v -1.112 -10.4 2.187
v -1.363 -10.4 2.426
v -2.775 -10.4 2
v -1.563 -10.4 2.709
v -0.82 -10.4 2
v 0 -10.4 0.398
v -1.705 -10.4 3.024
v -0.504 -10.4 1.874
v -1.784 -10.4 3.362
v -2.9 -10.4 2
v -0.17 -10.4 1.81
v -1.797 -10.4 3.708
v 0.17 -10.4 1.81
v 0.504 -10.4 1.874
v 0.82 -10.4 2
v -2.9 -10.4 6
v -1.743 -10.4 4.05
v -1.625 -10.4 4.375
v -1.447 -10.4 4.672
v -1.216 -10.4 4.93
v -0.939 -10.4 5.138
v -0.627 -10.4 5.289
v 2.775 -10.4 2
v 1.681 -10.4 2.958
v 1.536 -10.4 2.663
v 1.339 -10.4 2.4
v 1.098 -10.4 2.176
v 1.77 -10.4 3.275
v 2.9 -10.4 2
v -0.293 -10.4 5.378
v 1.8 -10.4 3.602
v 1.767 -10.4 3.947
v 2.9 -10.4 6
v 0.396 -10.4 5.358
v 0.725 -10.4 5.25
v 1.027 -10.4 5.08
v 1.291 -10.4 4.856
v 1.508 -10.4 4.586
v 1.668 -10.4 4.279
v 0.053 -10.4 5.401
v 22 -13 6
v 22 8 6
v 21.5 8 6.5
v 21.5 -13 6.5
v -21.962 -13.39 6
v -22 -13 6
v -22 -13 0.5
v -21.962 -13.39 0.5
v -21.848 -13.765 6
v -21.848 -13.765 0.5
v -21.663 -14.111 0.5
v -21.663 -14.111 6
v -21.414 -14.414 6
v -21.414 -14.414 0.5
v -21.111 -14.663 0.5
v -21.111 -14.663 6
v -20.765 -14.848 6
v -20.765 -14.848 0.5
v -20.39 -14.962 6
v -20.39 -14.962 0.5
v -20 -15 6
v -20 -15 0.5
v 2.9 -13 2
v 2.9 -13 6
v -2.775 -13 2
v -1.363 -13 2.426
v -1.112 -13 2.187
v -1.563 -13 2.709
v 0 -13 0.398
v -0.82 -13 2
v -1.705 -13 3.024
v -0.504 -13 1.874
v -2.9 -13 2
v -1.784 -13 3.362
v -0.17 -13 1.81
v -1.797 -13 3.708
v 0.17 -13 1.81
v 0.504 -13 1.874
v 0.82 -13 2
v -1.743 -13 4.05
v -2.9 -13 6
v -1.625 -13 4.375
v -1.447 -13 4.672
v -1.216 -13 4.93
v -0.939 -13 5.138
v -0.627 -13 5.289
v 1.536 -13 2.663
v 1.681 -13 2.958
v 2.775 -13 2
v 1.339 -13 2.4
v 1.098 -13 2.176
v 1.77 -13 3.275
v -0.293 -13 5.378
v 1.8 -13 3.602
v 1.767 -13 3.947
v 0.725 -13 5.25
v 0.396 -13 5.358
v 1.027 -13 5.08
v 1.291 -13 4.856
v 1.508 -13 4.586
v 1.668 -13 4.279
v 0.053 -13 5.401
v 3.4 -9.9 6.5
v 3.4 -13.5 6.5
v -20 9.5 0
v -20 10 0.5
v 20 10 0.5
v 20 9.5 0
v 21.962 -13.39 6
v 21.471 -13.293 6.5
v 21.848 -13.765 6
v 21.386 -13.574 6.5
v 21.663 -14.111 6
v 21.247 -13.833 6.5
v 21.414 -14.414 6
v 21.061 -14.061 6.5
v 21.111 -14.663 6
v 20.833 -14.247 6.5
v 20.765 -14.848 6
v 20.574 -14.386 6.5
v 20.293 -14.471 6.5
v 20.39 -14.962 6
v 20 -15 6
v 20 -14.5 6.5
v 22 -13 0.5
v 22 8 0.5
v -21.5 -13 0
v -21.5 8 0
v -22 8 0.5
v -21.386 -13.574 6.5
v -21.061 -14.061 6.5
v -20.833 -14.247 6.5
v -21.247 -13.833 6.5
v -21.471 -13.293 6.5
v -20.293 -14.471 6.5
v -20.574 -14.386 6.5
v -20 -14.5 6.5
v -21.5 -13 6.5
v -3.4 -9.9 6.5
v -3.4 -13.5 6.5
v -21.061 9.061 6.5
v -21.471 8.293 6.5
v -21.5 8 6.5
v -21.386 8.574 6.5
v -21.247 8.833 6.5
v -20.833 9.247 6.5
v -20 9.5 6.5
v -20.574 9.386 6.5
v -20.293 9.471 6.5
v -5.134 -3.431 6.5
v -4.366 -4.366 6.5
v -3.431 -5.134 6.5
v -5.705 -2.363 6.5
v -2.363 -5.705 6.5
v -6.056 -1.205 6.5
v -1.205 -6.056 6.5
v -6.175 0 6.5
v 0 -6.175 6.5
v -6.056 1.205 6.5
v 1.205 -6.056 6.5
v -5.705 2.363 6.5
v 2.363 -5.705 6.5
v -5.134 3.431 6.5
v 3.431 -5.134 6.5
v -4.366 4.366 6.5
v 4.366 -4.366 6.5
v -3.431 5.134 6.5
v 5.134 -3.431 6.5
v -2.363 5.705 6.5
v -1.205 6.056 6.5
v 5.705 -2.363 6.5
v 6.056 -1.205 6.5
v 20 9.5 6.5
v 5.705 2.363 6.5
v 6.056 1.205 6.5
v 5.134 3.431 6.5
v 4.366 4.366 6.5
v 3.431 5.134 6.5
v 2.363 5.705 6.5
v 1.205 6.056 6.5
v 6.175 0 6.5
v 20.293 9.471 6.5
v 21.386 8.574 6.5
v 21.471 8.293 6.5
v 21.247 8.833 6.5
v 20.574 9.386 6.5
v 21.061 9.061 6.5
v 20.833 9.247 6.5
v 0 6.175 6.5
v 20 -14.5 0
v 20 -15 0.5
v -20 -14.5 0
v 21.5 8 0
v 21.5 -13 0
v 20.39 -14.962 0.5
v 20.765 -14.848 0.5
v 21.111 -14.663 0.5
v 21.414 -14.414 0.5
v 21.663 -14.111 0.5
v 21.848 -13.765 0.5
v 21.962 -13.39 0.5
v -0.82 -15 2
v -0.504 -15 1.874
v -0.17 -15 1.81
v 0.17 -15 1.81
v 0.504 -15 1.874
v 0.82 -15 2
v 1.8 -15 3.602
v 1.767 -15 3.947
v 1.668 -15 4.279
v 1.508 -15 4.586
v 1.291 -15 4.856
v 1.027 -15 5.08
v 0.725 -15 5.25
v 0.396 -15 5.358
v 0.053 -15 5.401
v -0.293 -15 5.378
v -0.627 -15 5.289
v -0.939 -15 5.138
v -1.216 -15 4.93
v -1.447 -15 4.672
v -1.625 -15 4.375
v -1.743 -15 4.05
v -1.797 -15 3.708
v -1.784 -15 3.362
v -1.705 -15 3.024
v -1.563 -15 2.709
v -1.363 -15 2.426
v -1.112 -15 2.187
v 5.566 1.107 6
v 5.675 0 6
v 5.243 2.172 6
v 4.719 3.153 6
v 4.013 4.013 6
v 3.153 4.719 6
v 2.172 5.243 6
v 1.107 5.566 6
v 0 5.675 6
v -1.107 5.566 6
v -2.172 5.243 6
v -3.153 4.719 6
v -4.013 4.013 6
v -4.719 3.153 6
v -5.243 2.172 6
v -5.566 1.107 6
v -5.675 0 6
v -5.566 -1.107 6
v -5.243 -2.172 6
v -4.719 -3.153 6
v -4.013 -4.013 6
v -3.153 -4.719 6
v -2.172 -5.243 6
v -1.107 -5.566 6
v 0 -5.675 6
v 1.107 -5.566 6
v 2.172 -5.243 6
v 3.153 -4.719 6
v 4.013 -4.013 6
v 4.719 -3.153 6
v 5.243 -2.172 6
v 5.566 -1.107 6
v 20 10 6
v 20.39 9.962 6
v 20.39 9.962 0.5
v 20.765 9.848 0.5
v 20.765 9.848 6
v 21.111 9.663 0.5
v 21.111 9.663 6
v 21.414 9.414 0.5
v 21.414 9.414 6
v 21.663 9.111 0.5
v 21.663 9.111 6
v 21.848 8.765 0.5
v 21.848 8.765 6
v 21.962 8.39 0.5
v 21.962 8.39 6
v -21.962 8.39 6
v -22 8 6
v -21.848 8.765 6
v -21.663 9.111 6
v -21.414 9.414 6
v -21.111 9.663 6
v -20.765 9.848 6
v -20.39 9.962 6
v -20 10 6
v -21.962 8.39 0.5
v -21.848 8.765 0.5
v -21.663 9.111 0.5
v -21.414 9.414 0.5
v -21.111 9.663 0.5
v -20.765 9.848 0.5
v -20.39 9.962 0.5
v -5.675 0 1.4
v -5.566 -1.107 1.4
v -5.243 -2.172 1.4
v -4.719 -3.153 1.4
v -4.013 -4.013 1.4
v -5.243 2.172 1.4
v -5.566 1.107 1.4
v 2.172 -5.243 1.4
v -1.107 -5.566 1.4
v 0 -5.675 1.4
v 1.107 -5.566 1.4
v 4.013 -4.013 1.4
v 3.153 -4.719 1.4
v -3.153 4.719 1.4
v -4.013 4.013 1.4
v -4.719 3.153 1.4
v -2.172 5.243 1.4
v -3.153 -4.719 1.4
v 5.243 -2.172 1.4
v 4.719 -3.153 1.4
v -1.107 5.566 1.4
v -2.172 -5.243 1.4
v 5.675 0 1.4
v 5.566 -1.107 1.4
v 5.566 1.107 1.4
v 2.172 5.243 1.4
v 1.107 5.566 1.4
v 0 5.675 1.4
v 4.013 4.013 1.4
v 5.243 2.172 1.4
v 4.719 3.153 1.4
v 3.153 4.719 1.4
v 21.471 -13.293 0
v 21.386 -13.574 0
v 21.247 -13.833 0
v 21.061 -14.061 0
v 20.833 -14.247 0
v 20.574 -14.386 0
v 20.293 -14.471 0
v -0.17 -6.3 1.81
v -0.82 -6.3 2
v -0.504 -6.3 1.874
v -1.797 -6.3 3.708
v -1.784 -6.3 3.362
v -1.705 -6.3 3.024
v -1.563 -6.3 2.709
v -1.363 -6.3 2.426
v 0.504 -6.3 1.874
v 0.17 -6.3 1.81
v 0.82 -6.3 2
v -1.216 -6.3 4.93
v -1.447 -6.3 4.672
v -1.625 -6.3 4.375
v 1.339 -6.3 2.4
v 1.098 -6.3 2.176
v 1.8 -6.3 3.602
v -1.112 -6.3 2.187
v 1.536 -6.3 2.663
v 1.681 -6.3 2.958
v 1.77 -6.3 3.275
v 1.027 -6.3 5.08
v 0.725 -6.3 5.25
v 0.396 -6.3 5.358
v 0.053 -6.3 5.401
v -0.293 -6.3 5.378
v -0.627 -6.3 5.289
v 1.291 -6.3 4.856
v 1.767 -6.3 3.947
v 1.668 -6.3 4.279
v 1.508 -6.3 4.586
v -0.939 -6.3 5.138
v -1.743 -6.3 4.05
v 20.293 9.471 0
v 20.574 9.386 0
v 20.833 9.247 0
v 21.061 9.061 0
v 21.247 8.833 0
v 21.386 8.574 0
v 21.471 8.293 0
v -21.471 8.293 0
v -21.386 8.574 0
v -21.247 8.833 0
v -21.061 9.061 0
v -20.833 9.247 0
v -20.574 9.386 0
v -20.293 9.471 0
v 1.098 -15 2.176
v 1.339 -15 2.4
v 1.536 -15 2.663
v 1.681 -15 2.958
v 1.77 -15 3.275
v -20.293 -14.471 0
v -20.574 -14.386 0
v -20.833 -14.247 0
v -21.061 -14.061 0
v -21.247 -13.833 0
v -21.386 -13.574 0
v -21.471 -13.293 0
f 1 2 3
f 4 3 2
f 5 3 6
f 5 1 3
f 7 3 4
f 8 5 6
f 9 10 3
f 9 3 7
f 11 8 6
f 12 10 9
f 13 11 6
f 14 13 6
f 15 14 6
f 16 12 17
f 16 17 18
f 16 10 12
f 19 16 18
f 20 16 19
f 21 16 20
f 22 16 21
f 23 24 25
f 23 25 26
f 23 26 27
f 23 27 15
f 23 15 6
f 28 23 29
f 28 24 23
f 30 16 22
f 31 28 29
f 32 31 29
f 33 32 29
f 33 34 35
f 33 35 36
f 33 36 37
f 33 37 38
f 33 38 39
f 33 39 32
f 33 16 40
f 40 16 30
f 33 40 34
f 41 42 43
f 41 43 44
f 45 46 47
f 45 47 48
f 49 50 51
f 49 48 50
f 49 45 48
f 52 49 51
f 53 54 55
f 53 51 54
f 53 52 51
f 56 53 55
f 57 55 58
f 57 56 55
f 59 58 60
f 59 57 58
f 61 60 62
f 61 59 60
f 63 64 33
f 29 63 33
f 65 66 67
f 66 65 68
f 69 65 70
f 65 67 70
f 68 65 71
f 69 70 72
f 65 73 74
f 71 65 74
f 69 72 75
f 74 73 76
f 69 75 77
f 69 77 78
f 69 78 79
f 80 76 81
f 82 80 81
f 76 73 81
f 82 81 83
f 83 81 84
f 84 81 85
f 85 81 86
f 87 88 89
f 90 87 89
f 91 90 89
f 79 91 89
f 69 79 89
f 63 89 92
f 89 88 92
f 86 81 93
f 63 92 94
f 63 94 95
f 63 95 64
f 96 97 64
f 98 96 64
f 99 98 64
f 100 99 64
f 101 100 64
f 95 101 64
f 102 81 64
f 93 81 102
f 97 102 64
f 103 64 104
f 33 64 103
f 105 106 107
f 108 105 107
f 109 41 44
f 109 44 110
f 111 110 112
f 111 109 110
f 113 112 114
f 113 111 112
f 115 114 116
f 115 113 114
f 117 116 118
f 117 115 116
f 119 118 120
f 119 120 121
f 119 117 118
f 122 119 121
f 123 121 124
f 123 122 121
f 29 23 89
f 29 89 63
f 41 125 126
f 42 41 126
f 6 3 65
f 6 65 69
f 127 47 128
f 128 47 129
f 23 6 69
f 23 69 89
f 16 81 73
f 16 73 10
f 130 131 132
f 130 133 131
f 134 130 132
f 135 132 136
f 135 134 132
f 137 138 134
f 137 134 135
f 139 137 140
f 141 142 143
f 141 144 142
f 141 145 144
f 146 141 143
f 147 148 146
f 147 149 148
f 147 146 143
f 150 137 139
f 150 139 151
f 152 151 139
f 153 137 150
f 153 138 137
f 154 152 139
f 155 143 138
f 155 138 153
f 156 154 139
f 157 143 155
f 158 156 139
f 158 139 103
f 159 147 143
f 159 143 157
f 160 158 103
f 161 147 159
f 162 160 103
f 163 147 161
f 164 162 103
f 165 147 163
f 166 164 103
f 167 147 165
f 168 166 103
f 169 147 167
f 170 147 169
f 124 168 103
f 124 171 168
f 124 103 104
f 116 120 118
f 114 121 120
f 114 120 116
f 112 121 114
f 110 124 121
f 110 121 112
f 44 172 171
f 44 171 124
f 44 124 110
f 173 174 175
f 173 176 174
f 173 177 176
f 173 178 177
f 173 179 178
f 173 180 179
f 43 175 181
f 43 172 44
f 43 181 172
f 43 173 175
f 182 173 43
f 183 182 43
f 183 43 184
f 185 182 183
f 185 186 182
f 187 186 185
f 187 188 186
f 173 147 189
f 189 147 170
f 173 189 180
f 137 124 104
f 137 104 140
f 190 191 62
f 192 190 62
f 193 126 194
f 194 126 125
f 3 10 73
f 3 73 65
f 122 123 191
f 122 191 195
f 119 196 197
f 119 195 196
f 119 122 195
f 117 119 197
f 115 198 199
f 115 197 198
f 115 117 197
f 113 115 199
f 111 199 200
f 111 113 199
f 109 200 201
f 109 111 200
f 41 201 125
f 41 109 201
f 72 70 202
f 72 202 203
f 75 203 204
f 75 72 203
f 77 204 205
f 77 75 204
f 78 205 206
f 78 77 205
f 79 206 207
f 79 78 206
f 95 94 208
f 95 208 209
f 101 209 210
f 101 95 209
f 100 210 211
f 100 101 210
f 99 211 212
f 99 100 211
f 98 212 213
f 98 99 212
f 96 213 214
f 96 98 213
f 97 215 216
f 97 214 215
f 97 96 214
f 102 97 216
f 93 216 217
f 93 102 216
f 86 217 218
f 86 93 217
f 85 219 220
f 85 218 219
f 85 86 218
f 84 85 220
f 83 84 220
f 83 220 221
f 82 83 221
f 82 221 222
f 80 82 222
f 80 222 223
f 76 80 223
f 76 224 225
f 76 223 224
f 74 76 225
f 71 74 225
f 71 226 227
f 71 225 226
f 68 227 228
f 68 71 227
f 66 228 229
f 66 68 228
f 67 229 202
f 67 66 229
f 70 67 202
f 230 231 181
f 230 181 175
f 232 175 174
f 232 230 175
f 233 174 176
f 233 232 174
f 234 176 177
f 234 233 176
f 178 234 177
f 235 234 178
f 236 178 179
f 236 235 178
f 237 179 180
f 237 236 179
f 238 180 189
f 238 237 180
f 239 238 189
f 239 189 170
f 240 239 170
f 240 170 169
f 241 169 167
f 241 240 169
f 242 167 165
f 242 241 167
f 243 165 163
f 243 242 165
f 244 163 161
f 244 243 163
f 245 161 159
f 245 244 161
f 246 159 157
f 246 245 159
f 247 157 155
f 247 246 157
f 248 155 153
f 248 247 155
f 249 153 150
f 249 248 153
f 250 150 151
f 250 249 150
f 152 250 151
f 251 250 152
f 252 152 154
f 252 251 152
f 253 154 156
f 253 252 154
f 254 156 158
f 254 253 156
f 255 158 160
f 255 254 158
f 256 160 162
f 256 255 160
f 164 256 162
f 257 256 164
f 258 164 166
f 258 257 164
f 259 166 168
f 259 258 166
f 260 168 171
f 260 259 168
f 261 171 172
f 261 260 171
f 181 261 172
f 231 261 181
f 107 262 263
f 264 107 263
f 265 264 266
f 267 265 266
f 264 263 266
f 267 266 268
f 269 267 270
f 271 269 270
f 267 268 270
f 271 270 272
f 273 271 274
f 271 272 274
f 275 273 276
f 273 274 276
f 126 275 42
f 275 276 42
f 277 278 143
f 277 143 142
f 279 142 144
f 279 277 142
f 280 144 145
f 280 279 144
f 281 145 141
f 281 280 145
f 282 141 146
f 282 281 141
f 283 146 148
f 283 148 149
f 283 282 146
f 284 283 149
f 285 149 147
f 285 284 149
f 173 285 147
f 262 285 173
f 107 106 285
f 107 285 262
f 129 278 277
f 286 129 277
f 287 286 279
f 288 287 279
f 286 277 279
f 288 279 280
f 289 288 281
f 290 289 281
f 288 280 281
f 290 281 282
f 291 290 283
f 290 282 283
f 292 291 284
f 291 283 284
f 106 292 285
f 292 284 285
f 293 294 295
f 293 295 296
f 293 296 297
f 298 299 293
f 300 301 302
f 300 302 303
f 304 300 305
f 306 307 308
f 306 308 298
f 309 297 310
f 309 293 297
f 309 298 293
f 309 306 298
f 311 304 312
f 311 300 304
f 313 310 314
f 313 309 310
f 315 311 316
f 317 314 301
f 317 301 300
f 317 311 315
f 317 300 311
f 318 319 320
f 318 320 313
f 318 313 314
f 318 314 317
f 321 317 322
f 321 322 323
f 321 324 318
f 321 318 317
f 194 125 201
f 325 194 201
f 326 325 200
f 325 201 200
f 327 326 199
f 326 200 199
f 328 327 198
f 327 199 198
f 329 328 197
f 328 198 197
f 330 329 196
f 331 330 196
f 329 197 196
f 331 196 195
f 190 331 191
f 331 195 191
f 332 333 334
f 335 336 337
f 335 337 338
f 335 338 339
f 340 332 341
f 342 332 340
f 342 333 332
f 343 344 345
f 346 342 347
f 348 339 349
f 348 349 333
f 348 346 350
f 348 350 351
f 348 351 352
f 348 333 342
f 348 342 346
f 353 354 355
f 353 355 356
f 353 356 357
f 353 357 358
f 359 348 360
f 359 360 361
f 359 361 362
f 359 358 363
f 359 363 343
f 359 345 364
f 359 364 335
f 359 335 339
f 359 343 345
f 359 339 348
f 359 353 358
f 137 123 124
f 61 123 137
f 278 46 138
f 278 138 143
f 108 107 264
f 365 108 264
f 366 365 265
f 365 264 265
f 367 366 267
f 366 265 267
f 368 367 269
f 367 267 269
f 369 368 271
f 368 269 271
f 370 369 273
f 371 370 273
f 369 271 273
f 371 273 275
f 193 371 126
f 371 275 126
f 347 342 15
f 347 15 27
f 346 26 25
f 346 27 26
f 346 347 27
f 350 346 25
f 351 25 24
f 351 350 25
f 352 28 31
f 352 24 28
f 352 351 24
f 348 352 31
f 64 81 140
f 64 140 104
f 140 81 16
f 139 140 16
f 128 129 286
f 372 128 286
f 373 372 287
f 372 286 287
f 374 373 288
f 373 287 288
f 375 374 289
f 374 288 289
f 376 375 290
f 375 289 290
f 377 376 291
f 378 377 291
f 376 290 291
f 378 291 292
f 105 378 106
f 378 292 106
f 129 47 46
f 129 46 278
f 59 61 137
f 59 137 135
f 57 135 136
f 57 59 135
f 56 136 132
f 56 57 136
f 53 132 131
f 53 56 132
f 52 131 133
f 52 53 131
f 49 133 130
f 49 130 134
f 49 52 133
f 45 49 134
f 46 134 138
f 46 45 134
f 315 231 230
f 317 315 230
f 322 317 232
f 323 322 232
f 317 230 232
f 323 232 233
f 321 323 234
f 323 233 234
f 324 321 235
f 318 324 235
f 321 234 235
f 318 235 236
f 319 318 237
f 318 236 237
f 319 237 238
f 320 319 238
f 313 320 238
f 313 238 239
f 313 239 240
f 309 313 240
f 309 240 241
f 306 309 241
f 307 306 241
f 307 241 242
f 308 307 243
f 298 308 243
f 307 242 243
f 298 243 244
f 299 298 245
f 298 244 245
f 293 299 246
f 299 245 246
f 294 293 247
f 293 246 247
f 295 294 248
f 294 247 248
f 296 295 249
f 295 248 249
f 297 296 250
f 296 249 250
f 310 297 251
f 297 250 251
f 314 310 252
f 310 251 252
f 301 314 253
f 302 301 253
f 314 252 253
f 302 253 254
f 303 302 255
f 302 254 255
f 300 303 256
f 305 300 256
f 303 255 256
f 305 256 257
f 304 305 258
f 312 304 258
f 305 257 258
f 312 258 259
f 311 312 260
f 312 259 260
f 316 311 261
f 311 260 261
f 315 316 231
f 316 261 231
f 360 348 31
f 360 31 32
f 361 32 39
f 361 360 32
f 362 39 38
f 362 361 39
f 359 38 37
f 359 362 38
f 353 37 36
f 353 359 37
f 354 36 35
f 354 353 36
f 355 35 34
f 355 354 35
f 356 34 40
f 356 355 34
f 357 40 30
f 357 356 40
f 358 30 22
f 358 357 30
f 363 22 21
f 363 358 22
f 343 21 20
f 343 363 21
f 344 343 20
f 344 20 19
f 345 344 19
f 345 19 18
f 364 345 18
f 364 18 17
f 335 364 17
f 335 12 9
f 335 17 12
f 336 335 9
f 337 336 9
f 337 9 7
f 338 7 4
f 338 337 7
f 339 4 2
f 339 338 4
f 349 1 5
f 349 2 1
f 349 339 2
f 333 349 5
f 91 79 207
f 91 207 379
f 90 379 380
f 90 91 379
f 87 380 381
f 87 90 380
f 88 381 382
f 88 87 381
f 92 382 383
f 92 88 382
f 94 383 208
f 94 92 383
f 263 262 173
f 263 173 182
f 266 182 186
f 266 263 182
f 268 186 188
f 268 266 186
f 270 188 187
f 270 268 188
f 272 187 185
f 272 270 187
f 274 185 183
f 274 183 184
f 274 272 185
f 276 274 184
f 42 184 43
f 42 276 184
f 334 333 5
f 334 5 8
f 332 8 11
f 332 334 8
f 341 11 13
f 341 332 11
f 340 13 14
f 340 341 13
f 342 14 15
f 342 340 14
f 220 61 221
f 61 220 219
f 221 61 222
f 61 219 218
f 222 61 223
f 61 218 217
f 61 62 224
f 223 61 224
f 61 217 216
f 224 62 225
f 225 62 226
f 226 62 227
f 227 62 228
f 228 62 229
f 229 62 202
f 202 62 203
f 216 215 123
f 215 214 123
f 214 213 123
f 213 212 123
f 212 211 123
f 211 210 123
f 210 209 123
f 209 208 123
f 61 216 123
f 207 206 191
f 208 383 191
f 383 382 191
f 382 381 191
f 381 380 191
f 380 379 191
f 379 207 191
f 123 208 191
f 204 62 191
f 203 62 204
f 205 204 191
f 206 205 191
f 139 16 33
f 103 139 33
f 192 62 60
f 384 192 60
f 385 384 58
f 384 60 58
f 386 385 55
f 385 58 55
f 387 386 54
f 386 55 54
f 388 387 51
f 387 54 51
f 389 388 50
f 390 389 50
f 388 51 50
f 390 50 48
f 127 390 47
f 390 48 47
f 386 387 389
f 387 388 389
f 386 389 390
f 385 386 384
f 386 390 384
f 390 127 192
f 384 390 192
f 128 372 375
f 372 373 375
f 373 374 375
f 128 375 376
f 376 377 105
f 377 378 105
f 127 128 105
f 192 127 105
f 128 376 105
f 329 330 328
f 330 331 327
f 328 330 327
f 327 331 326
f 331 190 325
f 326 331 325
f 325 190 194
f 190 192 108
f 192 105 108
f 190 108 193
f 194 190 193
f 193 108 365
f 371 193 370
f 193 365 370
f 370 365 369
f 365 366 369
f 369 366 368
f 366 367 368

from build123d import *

# Parameters (mm, degrees)
SKIZZE1_W                            = 44
SKIZZE1_H                            = 25
AUFSATZ_LINEAR_AUSTRAGEN1_DEPTH      = 6.5
SKIZZE2_R                            = 5.675
SCHNITT_LINEAR_AUSTRAGEN1_DEPTH      = 5.1
VERRUNDUNG1_R                        = 2
SKIZZE8_W                            = 5.8
SKIZZE8_H                            = 2.6
SCHNITT_LINEAR_AUSTRAGEN5_DEPTH      = 4.5
SCHNITT_LINEAR_AUSTRAGEN6_DEPTH      = 2.6
SCHNITT_LINEAR_AUSTRAGEN7_DEPTH      = 31.698697041
SCHNITT_LINEAR_AUSTRAGEN7_DEPTH_BACK = 4.1
FASE1_SIZE                           = 0.5


with BuildPart() as part:
    # Skizze1 → Aufsatz-Linear austragen1 (new body)
    with BuildSketch(Plane.XY):
        with Locations((0, -2.5)):
            Rectangle(SKIZZE1_W, SKIZZE1_H)
    extrude(amount=AUFSATZ_LINEAR_AUSTRAGEN1_DEPTH)

    # Skizze2 → Schnitt-Linear austragen1 (cut)
    with BuildSketch(Plane.XY.offset(6.5)):
        Circle(SKIZZE2_R)
    extrude(amount=-SCHNITT_LINEAR_AUSTRAGEN1_DEPTH, mode=Mode.SUBTRACT)

    # Verrundung1
    verrundung1_edges = [part.edges().sort_by_distance(p)[0] for p in [
        (-22, 10, 3.25),
        (22, 10, 3.25),
        (22, -15, 3.25),
        (-22, -15, 3.25),
    ]]
    fillet(verrundung1_edges, radius=VERRUNDUNG1_R)

    # Skizze8 → Schnitt-Linear austragen5 (cut)
    with BuildSketch(Plane.XY.offset(6.5)):
        with Locations((0, -11.7)):
            Rectangle(SKIZZE8_W, SKIZZE8_H)
    extrude(amount=-SCHNITT_LINEAR_AUSTRAGEN5_DEPTH, mode=Mode.SUBTRACT)

    # Skizze9 → Schnitt-Linear austragen6 (cut)
    with BuildSketch(Plane.XZ.offset(10.4)):
        with BuildLine():
            Line((-0.820441954, 2), (-2.775, 2))
            Line((-2.775, 2), (0, 0.397853003))
            Line((0, 0.397853003), (2.775, 2))
            Line((2.775, 2), (0.820441954, 2))
            ThreePointArc((0.820441954, 2), (0, 1.802146997), (-0.820441954, 2))
        make_face()
        with BuildLine():
            ThreePointArc((1.8, 3.602146997), (-0.938936761, 5.137854573), (-0.820441954, 2))
            Line((-0.820441954, 2), (0.820441954, 2))
            ThreePointArc((0.820441954, 2), (1.535707576, 2.663210236), (1.8, 3.602146997))
        make_face()
        with BuildLine():
            Line((0.820441954, 2), (-0.820441954, 2))
            ThreePointArc((-0.820441954, 2), (0, 1.802146997), (0.820441954, 2))
        make_face()
    extrude(amount=SCHNITT_LINEAR_AUSTRAGEN6_DEPTH, mode=Mode.SUBTRACT)

    # Skizze9<3> → Schnitt-Linear austragen7 (cut, two sides: drawn at the far end of the back side and taken through both)
    with BuildSketch(Plane.XZ.offset(10.4).offset(-SCHNITT_LINEAR_AUSTRAGEN7_DEPTH_BACK)):
        with BuildLine():
            ThreePointArc((1.8, 3.602146997), (-0.938936761, 5.137854573), (-0.820441954, 2))
            Line((-0.820441954, 2), (0.820441954, 2))
            ThreePointArc((0.820441954, 2), (1.535707576, 2.663210236), (1.8, 3.602146997))
        make_face()
        with BuildLine():
            Line((0.820441954, 2), (-0.820441954, 2))
            ThreePointArc((-0.820441954, 2), (0, 1.802146997), (0.820441954, 2))
        make_face()
    extrude(amount=SCHNITT_LINEAR_AUSTRAGEN7_DEPTH + SCHNITT_LINEAR_AUSTRAGEN7_DEPTH_BACK, mode=Mode.SUBTRACT)

    # Fase1
    fase1_edges = [part.edges().sort_by_distance(p)[0] for p in [
        (-5.675, 0, 6.5),
        (0, 10, 0),
        (0, 10, 6.5),
        (-22, -2.5, 0),
        (22, -2.5, 0),
        (0, -15, 0),
        (-21.414213562, -14.414213562, 0),
        (-21.414213562, 9.414213562, 0),
        (21.414213562, -14.414213562, 0),
        (21.414213562, 9.414213562, 0),
        (22, -2.5, 6.5),
        (-22, -2.5, 6.5),
        (0, -15, 6.5),
        (-21.414213562, -14.414213562, 6.5),
        (-21.414213562, 9.414213562, 6.5),
        (21.414213562, -14.414213562, 6.5),
        (21.414213562, 9.414213562, 6.5),
        (2.9, -11.7, 6.5),
        (0, -10.4, 6.5),
        (-2.9, -11.7, 6.5),
        (0, -13, 6.5),
    ]]
    chamfer(fase1_edges, length=FASE1_SIZE)


solid = part.part
